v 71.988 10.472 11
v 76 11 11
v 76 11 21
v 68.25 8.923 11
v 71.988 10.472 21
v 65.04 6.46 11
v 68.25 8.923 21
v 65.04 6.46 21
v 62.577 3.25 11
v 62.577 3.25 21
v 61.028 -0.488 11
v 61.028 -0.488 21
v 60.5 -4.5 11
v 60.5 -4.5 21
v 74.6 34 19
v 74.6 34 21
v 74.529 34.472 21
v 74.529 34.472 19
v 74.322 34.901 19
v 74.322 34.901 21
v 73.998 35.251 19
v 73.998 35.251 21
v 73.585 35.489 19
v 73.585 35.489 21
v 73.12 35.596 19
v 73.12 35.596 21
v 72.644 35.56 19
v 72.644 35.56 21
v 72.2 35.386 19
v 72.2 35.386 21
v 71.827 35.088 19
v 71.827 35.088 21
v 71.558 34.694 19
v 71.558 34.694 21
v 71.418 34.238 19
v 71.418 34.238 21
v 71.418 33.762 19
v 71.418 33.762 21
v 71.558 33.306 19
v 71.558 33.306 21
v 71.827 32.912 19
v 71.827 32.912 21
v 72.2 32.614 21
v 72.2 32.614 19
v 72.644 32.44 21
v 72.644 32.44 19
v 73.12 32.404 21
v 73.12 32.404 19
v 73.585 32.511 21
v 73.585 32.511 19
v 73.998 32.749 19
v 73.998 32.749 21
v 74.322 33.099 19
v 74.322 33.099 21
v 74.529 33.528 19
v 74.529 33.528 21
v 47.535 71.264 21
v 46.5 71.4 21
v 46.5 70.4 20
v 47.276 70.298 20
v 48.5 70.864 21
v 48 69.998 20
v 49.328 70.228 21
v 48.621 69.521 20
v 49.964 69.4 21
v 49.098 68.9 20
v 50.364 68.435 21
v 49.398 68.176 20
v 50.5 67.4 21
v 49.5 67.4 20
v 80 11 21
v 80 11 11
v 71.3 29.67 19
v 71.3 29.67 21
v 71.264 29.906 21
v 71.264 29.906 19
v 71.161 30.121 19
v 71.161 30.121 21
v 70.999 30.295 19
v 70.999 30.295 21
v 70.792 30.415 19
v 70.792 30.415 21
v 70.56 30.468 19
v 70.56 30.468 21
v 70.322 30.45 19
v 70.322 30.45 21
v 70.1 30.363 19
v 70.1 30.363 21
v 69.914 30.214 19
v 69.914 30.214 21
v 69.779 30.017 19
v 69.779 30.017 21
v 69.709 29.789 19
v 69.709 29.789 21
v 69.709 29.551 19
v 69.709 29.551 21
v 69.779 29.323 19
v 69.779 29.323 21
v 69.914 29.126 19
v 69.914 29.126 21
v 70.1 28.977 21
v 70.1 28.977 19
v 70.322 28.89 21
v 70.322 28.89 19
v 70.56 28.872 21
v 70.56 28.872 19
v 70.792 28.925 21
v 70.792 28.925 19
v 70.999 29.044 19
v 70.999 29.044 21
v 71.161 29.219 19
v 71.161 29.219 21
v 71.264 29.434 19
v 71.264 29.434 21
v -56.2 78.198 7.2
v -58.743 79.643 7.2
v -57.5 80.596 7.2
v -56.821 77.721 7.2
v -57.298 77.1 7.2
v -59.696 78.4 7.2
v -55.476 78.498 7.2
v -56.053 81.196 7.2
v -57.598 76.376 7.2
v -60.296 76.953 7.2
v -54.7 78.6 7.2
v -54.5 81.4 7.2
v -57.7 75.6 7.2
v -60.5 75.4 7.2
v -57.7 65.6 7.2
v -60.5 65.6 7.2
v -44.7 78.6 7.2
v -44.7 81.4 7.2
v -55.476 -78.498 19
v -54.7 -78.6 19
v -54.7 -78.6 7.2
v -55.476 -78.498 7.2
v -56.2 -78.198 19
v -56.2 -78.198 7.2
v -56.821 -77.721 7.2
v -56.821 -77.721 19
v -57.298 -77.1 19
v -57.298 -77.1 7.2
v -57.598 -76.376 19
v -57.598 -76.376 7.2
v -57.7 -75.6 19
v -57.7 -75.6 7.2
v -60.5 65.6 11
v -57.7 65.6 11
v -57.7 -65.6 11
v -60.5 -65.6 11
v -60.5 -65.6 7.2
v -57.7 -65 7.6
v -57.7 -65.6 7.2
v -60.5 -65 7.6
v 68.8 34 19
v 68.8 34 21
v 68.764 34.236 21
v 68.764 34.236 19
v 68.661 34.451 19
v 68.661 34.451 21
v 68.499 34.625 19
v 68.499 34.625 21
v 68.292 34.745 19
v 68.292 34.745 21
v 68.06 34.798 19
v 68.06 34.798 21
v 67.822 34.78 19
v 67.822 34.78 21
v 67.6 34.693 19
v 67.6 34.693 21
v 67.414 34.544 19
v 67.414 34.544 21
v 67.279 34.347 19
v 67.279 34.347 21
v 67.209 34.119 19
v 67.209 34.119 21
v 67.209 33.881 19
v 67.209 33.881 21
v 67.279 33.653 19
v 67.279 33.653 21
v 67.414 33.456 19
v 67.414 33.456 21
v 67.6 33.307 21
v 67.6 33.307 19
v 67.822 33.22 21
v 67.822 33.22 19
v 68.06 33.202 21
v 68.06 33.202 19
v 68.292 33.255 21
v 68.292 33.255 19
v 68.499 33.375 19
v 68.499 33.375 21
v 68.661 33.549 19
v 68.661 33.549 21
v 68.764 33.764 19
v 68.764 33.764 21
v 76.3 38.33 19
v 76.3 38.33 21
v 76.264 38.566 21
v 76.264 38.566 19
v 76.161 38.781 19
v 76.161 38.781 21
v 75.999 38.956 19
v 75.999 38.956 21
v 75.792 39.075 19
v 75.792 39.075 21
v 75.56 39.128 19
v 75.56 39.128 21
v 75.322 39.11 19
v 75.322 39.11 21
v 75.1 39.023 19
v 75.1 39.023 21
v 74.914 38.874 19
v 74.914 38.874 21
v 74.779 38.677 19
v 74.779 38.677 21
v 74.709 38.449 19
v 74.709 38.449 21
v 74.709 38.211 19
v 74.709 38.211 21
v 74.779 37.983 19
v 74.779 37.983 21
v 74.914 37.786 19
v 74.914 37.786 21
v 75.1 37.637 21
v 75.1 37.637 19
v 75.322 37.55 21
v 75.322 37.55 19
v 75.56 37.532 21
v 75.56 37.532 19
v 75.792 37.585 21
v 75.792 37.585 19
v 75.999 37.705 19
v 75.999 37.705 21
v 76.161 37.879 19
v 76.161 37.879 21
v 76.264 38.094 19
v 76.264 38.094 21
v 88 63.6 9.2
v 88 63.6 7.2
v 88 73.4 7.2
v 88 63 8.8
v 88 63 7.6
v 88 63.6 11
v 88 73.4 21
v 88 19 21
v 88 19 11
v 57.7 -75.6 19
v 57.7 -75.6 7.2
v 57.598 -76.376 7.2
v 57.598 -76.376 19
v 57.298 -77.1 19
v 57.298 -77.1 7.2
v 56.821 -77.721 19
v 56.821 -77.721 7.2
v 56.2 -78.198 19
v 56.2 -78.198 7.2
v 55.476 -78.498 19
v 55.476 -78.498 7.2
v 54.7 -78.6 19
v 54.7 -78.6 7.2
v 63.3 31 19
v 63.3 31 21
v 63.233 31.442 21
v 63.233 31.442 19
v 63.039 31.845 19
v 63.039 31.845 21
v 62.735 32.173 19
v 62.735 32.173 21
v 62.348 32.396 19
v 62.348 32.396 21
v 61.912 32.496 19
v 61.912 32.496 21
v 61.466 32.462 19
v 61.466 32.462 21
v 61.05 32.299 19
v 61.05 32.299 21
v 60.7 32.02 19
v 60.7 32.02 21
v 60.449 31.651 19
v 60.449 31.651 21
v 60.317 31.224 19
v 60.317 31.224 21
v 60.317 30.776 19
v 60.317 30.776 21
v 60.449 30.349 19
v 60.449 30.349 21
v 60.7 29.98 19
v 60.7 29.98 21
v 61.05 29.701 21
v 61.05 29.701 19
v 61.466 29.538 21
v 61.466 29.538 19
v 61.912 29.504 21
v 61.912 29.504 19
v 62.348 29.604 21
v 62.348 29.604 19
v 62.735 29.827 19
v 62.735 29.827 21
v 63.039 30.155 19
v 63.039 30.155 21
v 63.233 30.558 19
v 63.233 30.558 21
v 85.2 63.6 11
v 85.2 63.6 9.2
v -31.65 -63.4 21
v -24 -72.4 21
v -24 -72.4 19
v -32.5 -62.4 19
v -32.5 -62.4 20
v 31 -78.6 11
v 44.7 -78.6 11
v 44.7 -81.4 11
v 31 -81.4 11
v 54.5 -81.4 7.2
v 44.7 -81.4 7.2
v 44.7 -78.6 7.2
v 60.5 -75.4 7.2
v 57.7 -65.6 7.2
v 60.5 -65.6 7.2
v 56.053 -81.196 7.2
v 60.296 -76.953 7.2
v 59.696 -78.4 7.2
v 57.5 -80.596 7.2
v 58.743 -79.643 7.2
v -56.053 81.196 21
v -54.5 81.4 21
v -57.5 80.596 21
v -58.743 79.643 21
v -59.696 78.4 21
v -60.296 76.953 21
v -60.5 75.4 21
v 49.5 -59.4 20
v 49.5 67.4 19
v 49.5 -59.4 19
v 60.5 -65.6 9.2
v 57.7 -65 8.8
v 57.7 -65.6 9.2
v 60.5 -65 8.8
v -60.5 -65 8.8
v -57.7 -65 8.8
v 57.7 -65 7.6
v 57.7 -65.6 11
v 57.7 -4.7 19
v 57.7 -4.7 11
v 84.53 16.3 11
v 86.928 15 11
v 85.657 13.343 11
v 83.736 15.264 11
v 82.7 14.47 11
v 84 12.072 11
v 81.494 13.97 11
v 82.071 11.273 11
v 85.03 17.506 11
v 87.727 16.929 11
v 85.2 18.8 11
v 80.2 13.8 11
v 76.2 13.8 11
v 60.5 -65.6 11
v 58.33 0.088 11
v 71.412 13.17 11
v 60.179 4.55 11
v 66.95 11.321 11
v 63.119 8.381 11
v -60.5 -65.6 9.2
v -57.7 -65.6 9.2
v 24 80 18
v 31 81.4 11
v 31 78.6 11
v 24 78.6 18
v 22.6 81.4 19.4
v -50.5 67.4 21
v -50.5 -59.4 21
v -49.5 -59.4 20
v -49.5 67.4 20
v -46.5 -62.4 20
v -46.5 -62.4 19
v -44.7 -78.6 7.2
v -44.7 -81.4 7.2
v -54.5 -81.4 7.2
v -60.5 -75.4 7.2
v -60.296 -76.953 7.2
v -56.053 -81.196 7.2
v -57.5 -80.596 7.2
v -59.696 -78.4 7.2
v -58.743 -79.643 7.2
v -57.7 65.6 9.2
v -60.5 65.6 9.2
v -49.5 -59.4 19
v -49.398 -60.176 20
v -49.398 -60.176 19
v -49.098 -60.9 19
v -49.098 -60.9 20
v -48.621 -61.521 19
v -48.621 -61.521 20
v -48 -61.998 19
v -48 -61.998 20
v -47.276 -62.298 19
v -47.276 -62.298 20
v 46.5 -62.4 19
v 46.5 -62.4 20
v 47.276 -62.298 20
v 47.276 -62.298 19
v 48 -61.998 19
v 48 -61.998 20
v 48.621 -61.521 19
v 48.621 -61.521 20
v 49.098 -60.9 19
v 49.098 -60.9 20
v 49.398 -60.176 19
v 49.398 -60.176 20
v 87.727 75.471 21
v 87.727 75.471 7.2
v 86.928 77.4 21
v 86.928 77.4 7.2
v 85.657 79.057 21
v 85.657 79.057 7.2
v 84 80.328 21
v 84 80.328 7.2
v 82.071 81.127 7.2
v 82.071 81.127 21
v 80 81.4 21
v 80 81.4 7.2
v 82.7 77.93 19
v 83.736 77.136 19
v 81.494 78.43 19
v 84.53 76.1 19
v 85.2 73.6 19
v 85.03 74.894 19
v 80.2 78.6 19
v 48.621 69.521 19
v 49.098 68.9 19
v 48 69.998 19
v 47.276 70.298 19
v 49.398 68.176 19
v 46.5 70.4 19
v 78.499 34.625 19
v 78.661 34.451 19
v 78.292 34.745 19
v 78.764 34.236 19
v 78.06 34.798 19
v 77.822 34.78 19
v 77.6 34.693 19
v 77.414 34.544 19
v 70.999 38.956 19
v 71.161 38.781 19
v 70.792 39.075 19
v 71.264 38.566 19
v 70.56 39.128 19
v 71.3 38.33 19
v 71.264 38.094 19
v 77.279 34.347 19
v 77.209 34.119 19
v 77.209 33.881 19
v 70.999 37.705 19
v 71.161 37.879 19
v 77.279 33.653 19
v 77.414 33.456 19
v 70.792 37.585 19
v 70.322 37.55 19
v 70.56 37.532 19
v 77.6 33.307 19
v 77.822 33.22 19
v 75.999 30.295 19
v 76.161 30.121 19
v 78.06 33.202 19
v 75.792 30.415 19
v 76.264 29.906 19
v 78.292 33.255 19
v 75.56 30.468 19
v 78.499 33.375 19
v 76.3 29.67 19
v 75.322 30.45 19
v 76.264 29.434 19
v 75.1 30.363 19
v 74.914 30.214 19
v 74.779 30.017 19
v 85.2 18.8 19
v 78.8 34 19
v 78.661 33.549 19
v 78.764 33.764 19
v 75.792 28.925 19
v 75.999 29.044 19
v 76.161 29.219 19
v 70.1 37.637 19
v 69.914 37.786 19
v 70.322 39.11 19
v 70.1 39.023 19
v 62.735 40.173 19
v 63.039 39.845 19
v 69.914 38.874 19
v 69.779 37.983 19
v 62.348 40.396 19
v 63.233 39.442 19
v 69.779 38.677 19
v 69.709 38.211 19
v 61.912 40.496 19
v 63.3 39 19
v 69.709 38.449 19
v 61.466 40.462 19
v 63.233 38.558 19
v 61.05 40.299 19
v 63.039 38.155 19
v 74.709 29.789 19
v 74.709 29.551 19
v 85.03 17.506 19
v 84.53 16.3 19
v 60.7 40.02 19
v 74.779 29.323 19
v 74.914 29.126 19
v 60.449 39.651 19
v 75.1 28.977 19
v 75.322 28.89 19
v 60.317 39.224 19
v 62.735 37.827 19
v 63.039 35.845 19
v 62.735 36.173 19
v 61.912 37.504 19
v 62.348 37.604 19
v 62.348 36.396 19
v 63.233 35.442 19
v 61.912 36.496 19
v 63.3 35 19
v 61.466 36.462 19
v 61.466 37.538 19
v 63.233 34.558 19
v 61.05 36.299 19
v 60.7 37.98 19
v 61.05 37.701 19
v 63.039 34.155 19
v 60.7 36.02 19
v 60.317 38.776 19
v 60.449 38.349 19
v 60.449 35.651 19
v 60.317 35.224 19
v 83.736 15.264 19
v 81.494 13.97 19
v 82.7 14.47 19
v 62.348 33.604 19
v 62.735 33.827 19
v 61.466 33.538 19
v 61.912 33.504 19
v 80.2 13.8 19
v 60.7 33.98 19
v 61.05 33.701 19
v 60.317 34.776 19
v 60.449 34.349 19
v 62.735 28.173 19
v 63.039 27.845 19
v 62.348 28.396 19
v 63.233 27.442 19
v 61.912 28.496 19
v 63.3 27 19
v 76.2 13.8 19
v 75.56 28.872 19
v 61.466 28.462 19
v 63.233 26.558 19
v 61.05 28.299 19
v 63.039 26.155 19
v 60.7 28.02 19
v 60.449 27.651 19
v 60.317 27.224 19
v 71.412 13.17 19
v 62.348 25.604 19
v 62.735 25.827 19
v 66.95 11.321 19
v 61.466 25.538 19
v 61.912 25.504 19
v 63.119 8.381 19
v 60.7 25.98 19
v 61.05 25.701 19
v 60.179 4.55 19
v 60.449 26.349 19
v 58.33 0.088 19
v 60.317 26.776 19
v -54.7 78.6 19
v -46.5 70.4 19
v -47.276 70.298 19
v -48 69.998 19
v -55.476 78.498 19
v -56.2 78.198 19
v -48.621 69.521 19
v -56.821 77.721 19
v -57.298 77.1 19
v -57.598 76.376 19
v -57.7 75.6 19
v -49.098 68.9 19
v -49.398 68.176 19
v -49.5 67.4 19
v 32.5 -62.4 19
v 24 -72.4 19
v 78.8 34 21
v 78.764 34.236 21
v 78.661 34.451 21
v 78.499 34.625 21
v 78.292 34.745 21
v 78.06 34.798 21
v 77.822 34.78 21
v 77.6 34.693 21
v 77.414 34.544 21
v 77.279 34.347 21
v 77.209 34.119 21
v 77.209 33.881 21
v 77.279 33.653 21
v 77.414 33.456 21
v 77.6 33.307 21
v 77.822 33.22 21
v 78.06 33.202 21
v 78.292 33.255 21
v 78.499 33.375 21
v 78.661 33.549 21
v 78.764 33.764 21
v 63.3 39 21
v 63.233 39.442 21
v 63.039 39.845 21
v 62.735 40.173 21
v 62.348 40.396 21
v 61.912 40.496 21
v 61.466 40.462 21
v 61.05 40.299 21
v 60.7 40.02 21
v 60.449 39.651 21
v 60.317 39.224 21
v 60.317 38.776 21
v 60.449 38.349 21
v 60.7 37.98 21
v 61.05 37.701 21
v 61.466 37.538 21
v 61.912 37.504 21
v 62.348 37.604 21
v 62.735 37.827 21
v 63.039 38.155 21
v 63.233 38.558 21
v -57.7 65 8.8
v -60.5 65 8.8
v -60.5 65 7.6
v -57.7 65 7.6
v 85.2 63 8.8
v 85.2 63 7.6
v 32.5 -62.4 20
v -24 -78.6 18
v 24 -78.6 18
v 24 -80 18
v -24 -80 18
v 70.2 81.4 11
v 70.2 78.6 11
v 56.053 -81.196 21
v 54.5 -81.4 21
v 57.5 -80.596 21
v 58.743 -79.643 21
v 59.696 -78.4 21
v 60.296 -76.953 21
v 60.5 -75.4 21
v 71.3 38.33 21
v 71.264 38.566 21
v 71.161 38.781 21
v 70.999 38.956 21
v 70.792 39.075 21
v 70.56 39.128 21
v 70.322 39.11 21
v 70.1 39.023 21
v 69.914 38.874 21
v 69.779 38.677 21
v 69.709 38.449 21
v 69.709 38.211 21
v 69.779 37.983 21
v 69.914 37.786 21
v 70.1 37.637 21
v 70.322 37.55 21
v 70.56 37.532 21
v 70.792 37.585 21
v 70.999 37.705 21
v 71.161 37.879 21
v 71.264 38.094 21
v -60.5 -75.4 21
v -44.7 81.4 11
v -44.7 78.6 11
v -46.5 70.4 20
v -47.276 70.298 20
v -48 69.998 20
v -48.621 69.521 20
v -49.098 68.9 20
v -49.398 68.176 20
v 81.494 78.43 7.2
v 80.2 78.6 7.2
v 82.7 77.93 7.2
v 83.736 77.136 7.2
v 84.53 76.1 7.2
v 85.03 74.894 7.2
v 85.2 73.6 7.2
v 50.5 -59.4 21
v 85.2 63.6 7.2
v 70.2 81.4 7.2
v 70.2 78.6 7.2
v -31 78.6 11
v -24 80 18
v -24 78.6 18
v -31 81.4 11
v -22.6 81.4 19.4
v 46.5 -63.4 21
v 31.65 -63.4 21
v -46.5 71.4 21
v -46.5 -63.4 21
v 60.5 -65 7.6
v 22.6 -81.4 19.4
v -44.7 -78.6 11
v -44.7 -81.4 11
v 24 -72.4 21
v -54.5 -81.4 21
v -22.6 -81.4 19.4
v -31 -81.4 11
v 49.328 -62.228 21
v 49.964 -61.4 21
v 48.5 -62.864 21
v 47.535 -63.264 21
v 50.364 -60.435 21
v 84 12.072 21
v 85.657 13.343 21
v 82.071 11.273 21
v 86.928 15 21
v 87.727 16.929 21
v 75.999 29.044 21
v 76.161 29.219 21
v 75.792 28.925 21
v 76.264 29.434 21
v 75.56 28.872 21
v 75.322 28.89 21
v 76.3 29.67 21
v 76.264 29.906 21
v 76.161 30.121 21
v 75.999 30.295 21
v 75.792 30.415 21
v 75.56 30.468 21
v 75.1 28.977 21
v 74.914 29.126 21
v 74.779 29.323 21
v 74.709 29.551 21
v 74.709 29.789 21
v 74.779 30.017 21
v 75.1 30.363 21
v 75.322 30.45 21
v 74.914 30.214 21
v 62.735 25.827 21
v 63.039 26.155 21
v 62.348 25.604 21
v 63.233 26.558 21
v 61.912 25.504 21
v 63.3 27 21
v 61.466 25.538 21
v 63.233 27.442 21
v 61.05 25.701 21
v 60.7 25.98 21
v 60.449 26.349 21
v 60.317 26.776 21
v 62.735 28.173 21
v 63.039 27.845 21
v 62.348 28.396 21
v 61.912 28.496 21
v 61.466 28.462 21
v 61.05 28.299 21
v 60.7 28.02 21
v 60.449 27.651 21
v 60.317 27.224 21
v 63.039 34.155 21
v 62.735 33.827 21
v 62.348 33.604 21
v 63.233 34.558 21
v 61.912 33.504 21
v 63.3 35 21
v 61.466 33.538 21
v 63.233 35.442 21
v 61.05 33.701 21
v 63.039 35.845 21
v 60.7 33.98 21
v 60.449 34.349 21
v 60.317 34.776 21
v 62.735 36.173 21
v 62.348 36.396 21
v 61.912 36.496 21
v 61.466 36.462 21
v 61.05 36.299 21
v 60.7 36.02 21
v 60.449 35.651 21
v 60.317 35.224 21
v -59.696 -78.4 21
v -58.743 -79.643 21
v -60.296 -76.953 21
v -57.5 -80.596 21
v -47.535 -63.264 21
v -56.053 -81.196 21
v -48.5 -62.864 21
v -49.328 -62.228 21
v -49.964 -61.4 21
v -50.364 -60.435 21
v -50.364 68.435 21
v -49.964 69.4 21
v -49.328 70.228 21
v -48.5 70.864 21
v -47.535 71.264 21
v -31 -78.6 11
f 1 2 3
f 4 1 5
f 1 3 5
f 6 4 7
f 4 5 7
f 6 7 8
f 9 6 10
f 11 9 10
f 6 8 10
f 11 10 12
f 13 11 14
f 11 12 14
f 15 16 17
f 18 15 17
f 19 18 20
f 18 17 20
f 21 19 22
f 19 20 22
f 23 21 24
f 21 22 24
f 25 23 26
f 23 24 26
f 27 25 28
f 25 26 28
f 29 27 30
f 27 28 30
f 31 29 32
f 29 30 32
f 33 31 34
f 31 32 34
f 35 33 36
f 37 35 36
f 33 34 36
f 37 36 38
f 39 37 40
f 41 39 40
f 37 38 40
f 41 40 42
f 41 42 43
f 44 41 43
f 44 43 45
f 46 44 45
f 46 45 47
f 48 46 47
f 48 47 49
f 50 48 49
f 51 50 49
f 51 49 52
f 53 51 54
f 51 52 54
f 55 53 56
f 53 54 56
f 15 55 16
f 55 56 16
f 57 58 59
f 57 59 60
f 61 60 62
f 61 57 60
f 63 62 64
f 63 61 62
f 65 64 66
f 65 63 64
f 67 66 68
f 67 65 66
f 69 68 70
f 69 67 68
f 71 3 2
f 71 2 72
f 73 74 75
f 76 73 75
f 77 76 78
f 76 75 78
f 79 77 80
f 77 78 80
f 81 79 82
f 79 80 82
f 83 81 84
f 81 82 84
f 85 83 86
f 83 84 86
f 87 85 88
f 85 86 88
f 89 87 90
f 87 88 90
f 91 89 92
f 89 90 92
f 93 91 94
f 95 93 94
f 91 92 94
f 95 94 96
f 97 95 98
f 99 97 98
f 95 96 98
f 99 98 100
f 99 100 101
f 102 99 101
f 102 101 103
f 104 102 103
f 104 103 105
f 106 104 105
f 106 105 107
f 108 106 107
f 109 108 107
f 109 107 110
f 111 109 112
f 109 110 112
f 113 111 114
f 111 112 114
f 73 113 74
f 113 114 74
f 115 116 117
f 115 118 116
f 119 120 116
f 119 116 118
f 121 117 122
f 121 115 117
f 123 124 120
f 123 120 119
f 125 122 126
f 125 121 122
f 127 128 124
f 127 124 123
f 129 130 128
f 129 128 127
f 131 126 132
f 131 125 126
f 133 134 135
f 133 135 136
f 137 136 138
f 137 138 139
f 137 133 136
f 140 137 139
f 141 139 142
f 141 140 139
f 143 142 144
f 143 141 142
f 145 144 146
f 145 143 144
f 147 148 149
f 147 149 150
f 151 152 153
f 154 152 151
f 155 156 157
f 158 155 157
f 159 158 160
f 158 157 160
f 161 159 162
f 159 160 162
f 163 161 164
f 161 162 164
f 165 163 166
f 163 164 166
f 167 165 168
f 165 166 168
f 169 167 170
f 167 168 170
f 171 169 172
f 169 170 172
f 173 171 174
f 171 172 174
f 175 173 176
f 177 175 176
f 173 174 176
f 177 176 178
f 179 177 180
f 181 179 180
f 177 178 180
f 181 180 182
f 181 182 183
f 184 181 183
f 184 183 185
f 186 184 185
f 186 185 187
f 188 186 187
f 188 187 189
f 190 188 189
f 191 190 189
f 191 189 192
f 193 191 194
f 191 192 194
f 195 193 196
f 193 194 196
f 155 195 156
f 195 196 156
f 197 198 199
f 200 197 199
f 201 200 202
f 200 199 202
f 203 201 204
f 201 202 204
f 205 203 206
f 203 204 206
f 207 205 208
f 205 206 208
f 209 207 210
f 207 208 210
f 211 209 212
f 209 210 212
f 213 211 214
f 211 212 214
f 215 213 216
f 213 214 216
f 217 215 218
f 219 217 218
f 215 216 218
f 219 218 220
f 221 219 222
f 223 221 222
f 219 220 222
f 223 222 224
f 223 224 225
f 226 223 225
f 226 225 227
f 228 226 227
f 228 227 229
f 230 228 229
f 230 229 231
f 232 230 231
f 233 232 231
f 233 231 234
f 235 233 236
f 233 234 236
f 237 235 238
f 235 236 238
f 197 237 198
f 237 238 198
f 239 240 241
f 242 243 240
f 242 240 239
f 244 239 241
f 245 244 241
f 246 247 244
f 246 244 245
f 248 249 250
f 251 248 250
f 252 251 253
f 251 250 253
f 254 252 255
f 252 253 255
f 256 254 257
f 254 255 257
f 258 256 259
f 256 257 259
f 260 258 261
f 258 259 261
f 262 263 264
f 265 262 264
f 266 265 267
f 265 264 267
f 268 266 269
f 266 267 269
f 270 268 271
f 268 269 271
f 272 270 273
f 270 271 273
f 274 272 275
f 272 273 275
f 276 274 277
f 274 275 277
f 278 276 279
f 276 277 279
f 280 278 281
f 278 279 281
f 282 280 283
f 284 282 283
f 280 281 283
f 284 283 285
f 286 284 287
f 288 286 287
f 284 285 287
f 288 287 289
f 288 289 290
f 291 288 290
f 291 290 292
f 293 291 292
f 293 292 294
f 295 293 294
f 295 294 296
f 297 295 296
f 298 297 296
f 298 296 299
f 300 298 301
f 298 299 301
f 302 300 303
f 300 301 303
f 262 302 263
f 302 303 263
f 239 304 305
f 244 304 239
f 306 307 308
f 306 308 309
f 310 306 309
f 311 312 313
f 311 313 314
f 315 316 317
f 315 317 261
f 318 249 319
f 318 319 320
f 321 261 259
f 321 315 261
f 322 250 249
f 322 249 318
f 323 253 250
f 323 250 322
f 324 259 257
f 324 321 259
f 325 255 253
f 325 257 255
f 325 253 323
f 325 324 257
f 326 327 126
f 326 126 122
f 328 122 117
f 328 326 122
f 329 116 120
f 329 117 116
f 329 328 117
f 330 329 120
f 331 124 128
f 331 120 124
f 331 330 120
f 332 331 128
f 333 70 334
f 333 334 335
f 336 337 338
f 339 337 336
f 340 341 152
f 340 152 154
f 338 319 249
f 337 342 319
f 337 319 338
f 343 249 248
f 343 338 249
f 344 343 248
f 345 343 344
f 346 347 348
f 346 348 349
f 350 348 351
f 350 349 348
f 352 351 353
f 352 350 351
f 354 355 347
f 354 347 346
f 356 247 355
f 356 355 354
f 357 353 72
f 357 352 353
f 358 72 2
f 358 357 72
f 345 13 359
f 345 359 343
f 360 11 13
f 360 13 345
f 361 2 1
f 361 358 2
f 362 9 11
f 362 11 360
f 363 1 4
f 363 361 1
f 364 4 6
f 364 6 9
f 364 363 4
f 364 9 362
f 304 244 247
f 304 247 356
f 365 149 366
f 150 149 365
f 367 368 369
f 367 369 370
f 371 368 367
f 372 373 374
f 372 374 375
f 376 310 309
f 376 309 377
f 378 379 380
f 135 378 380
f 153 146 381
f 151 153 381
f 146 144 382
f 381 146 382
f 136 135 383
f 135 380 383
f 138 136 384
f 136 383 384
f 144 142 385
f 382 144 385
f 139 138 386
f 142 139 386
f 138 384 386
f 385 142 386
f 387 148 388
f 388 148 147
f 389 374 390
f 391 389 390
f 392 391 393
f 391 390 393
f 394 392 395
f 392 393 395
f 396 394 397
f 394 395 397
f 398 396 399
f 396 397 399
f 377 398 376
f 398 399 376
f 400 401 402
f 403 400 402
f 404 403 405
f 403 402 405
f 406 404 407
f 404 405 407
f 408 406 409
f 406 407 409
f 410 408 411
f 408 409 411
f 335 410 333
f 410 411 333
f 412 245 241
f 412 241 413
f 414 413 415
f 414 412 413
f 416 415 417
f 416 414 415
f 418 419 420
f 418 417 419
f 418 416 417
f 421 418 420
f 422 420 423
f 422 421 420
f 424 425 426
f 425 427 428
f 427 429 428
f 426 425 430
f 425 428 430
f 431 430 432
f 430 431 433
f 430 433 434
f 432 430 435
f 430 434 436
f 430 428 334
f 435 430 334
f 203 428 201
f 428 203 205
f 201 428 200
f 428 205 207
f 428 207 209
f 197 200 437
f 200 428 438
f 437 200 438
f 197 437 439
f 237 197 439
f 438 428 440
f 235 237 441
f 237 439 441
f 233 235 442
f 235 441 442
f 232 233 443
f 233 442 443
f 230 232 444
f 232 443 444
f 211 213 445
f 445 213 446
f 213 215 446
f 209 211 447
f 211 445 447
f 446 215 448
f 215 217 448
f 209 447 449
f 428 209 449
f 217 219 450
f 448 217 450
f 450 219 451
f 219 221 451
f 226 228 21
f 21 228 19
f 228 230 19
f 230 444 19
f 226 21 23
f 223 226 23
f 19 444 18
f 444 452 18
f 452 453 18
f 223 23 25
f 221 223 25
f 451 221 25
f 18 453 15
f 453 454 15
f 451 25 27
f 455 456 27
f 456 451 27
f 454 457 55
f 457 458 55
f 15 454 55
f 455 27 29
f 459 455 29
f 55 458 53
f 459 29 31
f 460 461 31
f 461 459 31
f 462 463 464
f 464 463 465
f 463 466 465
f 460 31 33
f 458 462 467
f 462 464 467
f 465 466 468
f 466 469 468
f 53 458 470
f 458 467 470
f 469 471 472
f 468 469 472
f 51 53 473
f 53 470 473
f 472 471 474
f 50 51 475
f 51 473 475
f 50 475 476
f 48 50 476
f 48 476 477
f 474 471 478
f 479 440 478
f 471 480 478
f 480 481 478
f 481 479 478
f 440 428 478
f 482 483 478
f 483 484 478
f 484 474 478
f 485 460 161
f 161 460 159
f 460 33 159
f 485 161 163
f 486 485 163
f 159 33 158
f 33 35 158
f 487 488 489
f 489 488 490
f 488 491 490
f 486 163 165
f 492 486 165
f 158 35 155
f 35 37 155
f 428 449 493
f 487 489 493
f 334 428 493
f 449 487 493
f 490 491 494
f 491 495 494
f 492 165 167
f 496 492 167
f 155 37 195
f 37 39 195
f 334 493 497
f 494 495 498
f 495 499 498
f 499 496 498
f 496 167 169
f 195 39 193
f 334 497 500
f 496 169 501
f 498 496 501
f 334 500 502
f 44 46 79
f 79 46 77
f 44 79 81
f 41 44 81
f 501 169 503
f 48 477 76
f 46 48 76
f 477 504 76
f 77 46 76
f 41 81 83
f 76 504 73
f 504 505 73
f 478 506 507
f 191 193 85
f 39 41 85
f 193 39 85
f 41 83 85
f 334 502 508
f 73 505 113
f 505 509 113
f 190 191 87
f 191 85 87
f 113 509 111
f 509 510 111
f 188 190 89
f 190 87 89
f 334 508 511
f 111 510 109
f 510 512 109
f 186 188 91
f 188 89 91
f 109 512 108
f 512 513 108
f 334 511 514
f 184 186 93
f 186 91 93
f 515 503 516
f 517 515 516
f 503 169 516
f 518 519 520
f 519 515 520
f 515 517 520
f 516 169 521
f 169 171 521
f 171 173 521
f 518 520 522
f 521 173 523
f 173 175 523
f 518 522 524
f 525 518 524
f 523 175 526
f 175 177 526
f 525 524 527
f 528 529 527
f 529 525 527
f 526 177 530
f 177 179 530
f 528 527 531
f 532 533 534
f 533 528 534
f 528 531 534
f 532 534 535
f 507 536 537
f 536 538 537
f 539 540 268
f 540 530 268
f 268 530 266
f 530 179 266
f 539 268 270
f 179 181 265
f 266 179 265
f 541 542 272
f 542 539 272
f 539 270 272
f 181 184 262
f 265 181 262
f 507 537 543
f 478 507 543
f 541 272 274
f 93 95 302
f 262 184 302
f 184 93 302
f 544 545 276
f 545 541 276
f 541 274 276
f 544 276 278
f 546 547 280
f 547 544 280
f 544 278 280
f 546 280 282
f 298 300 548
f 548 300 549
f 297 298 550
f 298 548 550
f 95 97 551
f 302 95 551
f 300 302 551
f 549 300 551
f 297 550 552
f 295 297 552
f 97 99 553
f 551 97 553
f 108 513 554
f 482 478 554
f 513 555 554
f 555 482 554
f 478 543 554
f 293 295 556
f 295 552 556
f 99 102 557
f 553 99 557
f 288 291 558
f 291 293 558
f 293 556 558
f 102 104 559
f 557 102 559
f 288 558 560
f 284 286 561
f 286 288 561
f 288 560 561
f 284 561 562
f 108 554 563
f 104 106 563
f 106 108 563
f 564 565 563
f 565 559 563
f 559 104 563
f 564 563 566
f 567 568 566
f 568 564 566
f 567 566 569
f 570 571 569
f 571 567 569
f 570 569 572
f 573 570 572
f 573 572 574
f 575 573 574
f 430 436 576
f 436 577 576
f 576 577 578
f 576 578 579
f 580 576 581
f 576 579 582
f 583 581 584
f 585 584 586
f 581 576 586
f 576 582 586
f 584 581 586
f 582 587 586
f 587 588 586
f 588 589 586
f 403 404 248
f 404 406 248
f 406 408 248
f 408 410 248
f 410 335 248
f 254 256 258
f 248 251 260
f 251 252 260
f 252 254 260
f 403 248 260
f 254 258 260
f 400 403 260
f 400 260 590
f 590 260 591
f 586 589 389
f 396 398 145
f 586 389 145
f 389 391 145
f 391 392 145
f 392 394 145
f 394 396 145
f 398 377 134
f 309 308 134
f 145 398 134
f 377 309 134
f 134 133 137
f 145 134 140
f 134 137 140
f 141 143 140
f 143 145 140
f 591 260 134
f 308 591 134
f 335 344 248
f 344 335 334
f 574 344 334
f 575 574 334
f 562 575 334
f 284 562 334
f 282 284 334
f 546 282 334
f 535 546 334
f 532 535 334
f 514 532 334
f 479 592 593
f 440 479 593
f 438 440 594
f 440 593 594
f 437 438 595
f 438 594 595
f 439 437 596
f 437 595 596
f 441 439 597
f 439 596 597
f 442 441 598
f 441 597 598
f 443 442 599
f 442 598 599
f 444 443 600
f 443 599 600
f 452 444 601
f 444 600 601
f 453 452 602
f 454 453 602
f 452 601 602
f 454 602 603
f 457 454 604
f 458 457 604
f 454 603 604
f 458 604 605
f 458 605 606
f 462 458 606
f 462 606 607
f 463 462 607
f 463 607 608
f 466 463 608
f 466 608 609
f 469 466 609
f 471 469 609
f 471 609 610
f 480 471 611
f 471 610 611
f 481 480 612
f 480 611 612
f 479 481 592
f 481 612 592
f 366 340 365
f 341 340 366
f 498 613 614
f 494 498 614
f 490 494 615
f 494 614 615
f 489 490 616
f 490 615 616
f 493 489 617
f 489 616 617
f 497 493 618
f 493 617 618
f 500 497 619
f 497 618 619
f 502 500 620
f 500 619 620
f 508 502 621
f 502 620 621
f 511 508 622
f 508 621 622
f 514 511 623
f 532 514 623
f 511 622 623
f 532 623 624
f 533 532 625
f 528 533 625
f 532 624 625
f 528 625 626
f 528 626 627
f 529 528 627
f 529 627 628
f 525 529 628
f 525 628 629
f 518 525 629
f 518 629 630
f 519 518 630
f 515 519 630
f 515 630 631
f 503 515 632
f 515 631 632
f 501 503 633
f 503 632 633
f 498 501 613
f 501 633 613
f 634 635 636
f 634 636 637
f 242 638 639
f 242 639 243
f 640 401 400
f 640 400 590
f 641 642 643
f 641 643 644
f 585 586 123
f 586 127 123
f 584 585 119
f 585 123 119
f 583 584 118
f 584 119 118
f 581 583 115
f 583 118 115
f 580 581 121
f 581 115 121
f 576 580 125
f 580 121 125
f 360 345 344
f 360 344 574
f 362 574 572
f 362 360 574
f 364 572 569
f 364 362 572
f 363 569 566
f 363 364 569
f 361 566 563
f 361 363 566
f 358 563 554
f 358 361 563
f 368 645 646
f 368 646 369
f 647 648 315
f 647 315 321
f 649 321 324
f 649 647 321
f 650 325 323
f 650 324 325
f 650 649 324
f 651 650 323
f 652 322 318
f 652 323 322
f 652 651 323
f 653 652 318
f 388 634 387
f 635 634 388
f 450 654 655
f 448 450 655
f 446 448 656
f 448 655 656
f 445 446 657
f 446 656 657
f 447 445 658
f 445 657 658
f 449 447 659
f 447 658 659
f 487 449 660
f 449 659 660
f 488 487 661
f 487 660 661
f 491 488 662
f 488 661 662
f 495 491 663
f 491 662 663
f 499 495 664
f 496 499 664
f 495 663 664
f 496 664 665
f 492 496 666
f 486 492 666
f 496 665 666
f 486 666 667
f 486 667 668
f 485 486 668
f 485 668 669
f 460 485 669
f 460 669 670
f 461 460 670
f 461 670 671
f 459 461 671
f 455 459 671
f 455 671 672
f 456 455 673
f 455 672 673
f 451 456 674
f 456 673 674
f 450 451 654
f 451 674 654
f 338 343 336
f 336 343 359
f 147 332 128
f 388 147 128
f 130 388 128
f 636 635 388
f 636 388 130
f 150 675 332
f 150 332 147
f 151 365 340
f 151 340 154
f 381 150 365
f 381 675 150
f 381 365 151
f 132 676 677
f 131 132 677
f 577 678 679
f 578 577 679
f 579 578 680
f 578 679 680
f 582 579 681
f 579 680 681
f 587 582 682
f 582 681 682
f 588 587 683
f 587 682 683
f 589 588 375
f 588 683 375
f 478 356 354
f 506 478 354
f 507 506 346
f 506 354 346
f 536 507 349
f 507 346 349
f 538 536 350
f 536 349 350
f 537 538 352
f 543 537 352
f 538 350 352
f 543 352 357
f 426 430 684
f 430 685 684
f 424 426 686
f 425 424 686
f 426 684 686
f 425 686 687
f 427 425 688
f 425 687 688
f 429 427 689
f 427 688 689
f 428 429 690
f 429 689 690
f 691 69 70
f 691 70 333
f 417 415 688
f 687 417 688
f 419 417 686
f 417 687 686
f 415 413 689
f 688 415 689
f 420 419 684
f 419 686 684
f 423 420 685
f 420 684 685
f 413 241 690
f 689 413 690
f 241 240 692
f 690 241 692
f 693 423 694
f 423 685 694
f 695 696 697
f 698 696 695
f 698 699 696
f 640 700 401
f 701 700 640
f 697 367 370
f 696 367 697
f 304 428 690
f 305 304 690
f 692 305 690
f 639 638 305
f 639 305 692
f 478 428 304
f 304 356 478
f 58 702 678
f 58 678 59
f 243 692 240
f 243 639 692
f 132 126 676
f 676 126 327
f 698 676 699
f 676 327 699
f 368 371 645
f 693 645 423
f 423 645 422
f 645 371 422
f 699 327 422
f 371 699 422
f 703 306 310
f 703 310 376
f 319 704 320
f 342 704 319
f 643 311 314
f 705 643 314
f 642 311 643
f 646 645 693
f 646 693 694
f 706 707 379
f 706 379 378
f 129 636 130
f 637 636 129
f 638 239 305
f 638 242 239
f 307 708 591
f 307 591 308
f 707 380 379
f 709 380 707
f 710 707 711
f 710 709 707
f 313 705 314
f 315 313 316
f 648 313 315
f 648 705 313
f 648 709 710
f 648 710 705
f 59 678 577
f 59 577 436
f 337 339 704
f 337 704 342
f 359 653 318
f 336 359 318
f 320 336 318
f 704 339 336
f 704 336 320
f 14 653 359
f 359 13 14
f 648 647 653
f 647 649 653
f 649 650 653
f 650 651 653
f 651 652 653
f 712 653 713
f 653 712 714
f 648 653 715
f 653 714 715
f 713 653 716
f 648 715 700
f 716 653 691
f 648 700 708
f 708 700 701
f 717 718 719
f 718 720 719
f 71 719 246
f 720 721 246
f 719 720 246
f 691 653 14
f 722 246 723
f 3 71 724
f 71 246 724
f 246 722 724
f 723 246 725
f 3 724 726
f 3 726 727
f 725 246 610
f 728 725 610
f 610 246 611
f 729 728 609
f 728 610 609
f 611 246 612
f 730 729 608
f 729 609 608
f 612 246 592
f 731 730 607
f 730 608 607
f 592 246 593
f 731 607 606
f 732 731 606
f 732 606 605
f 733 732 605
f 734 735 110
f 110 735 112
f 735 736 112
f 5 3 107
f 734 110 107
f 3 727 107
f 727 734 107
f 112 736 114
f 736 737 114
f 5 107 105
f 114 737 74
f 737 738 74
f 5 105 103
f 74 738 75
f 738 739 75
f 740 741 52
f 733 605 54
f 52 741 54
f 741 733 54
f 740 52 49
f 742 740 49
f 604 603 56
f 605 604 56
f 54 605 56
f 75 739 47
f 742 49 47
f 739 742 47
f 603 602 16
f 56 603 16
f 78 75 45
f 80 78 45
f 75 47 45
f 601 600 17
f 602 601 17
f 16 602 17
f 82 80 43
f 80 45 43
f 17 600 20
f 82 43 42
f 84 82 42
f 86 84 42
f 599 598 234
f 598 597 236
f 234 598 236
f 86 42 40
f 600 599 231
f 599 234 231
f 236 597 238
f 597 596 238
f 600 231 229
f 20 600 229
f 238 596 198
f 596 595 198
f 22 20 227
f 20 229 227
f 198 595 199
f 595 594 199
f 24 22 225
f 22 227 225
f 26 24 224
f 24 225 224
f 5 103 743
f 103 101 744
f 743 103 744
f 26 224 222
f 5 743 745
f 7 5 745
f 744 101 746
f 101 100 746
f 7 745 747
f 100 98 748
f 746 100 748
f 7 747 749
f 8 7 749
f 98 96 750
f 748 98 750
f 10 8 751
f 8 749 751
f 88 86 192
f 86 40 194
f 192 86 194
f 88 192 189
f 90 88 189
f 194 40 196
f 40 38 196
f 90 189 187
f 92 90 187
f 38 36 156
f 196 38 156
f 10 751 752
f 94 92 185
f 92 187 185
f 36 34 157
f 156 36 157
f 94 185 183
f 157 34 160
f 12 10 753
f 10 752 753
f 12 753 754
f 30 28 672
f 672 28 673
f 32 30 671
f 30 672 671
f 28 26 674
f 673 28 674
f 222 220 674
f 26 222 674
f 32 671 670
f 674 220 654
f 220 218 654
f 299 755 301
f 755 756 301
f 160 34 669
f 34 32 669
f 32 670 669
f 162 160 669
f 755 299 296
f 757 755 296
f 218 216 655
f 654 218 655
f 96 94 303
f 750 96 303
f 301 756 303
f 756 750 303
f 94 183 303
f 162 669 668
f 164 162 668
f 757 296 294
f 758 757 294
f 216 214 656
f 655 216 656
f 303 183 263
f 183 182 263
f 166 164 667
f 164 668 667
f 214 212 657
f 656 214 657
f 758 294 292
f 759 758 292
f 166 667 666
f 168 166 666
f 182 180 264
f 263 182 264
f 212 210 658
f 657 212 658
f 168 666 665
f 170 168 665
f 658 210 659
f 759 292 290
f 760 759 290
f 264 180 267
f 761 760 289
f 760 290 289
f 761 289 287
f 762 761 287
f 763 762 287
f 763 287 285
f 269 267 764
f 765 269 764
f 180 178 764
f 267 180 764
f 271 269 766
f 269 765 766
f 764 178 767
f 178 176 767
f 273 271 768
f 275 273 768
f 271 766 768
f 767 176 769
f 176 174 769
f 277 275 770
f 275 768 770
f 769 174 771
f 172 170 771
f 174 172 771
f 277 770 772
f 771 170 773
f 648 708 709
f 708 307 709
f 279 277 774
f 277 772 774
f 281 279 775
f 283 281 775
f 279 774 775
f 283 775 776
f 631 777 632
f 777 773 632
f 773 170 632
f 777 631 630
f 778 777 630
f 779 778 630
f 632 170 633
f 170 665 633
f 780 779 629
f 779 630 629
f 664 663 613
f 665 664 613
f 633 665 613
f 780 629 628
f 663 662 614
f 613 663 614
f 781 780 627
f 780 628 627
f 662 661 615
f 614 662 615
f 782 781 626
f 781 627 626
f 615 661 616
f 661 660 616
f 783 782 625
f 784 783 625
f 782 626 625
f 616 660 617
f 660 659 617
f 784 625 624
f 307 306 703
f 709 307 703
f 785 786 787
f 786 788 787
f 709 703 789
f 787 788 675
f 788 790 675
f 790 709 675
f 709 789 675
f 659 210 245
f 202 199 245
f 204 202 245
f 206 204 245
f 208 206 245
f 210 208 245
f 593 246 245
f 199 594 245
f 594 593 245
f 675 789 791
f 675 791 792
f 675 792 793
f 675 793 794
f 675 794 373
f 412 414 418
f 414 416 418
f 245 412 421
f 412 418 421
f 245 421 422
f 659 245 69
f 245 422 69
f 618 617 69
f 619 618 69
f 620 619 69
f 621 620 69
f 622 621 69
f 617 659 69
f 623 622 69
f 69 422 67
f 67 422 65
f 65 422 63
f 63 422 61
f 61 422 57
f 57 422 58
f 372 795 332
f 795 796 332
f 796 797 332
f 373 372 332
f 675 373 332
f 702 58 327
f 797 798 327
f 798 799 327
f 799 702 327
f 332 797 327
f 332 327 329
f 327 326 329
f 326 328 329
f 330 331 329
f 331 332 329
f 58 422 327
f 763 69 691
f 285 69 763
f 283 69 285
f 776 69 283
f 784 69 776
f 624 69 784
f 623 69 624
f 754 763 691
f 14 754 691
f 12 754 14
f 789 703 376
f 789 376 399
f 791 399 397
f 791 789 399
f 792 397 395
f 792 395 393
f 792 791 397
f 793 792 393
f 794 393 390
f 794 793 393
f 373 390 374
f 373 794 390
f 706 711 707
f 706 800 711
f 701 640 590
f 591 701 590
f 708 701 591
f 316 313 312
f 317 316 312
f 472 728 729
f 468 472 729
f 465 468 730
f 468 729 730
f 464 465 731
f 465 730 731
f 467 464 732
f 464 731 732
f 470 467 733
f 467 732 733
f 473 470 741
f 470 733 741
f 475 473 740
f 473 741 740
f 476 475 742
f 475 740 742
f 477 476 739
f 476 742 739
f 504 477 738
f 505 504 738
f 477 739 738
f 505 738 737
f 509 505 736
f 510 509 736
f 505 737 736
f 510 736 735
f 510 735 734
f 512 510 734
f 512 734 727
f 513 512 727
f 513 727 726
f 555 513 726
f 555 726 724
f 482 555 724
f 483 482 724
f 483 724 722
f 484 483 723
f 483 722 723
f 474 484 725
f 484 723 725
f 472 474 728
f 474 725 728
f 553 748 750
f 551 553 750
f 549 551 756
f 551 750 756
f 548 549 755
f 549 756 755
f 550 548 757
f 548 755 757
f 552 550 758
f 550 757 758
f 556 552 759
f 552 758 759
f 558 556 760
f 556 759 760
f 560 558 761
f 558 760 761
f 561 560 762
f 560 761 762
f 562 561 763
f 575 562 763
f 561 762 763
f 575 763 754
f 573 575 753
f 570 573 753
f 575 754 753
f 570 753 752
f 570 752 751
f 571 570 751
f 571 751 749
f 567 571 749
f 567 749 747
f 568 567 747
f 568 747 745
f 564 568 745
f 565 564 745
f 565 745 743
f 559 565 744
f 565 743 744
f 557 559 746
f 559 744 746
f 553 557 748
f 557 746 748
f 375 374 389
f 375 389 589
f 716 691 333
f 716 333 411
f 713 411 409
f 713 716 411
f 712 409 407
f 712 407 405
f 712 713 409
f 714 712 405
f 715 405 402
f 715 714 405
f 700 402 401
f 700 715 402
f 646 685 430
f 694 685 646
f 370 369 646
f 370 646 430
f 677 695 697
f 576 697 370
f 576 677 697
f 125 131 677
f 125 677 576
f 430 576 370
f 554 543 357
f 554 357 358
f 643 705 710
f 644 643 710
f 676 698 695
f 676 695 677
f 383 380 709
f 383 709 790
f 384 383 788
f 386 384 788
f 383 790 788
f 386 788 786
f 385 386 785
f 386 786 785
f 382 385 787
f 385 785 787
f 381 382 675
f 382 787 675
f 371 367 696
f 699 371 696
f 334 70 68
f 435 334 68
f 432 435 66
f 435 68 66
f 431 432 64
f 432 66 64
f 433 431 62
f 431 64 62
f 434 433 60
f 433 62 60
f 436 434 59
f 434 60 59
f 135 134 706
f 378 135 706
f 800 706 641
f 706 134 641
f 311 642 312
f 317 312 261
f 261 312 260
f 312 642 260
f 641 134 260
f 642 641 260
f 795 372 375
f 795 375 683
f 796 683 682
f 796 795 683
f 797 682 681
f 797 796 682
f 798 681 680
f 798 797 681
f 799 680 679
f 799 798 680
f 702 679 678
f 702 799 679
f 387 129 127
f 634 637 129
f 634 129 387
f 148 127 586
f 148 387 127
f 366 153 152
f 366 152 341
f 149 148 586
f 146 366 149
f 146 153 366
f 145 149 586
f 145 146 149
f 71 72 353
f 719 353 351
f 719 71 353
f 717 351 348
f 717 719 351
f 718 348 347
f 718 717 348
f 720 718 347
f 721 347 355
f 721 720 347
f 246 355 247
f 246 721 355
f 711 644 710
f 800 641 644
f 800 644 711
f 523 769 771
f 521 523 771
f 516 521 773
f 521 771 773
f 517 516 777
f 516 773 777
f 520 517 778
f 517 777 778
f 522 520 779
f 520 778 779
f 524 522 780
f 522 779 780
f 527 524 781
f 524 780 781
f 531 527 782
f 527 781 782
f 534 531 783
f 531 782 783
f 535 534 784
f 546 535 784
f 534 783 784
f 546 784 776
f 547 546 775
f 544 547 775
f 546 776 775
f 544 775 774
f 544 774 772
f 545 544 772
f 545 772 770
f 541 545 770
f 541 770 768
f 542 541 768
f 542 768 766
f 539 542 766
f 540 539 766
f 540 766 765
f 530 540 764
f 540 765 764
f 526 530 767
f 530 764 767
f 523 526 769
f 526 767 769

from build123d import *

# Parameters (mm, degrees)
PAD007_DEPTH    = 10
POCKET006_DEPTH = 8
POCKET007_DEPTH = 2
SKETCH022_R     = 1.5
SKETCH022_R_2   = 1.6
SKETCH022_R_3   = 0.8
POCKET009_DEPTH = 2
POCKET010_DEPTH = 162.801
PAD011_DEPTH    = 3.8
SKETCH045_W     = 2.8
SKETCH045_H     = 2
SKETCH046_W     = 2.8
SKETCH046_H     = 1.2
SKETCH047_W     = 2.8
SKETCH047_H     = 2
SKETCH048_W     = 2.8
SKETCH048_H     = 1.2
SKETCH049_W     = 2.8
SKETCH049_H     = 2
SKETCH050_W     = 2.8
SKETCH050_H     = 1.2
SKETCH051_W     = 2.8
SKETCH051_H     = 2
SKETCH052_W     = 2.8
SKETCH052_H     = 1.2
CHAMFER003_SIZE = 1.4
CHAMFER004_SIZE = 1


with BuildPart() as part:
    # Sketch014 → Pad007 (new body)
    with BuildSketch(Plane.XY):
        with BuildLine():
            Line((-54.5, 81.4), (80, 81.4))
            ThreePointArc((88, 73.4), (85.656854, 79.056854), (80, 81.4))
            Line((88, 73.4), (88, 19))
            ThreePointArc((80, 11), (85.656854, 13.343146), (88, 19))
            Line((76, 11), (80, 11))
            ThreePointArc((76, 11), (65.039845, 6.460155), (60.5, -4.5))
            Line((60.5, -75.4), (60.5, -4.5))
            ThreePointArc((54.5, -81.4), (58.742641, -79.642641), (60.5, -75.4))
            Line((54.5, -81.4), (-54.5, -81.4))
            ThreePointArc((-60.5, -75.4), (-58.742641, -79.642641), (-54.5, -81.4))
            Line((-60.5, -75.4), (-60.5, 75.4))
            ThreePointArc((-54.5, 81.4), (-58.742641, 79.642641), (-60.5, 75.4))
        make_face()
    extrude(amount=-PAD007_DEPTH)

    # Sketch017 (on Face14 of Pad007) → Pocket006 (cut)
    with BuildSketch(Plane(origin=(0, 0, -10), x_dir=(1, 0, 0), z_dir=(0, 0, -1))):
        with BuildLine():
            Line((-54.7, 78.6), (54.7, 78.6))
            ThreePointArc((57.7, 75.6), (56.82132, 77.72132), (54.7, 78.6))
            Line((57.7, 4.7), (57.7, 75.6))
            ThreePointArc((57.7, 4.7), (63.118525, -8.381475), (76.2, -13.8))
            Line((80.2, -13.8), (76.2, -13.8))
            ThreePointArc((85.2, -18.8), (83.735534, -15.264466), (80.2, -13.8))
            Line((85.2, -18.8), (85.2, -73.6))
            ThreePointArc((80.2, -78.6), (83.735534, -77.135534), (85.2, -73.6))
            Line((80.2, -78.6), (-54.7, -78.6))
            ThreePointArc((-57.7, -75.6), (-56.82132, -77.72132), (-54.7, -78.6))
            Line((-57.7, -75.6), (-57.7, 75.6))
            ThreePointArc((-54.7, 78.6), (-56.82132, 77.72132), (-57.7, 75.6))
        make_face()
    extrude(amount=-POCKET006_DEPTH, mode=Mode.SUBTRACT)

    # Sketch018 (on Face4 of Pocket006) → Pocket007 (cut)
    with BuildSketch(Plane.XY):
        with BuildLine():
            Line((-46.5, 70.4), (46.5, 70.4))
            ThreePointArc((49.5, 67.4), (48.62132, 69.52132), (46.5, 70.4))
            Line((49.5, 67.4), (49.5, -59.4))
            ThreePointArc((46.5, -62.4), (48.62132, -61.52132), (49.5, -59.4))
            Line((46.5, -62.4), (32.5, -62.4))
            Line((32.5, -62.4), (24, -72.4))
            Line((24, -72.4), (-24, -72.4))
            Line((-24, -72.4), (-32.5, -62.4))
            Line((-32.5, -62.4), (-46.5, -62.4))
            ThreePointArc((-49.5, -59.4), (-48.62132, -61.52132), (-46.5, -62.4))
            Line((-49.5, -59.4), (-49.5, 67.4))
            ThreePointArc((-46.5, 70.4), (-48.62132, 69.52132), (-49.5, 67.4))
        make_face()
    extrude(amount=-POCKET007_DEPTH, mode=Mode.SUBTRACT)

    # Sketch022 (on Face4 of Pocket007) → Pocket009 (cut)
    with BuildSketch(Plane.XY):
        with Locations((61.8, 39)):
            Circle(SKETCH022_R)
        with Locations((61.8, 35)):
            Circle(SKETCH022_R)
        with Locations((61.8, 31)):
            Circle(SKETCH022_R)
        with Locations((61.8, 27)):
            Circle(SKETCH022_R)
        with Locations((73, 34)):
            Circle(SKETCH022_R_2)
        with Locations((70.5, 38.330127)):
            Circle(SKETCH022_R_3)
        with Locations((75.5, 38.330127)):
            Circle(SKETCH022_R_3)
        with Locations((78, 34)):
            Circle(SKETCH022_R_3)
        with Locations((75.5, 29.669873)):
            Circle(SKETCH022_R_3)
        with Locations((70.5, 29.669873)):
            Circle(SKETCH022_R_3)
        with Locations((68, 34)):
            Circle(SKETCH022_R_3)
    extrude(amount=-POCKET009_DEPTH, mode=Mode.SUBTRACT)

    # Sketch023 (on Face7 of Pocket009) → Pocket010 (cut, through all)
    with BuildSketch(Plane(origin=(0, 81.4, 0), x_dir=(-1, 0, 0), z_dir=(0, 1, 0))):
        Polygon((-24, -3), (24, -3), (31, -10), (-31, -10), align=None)
    extrude(amount=-POCKET010_DEPTH, mode=Mode.SUBTRACT)

    # Sketch026 (on Face5 of Pocket010) → Pad011 (join)
    with BuildSketch(Plane(origin=(0, 0, -10), x_dir=(1, 0, 0), z_dir=(0, 0, -1))):
        with BuildLine():
            Line((-54.5, 81.4), (-44.7, 81.4))
            Line((-44.7, 81.4), (-44.7, 78.6))
            Line((-54.7, 78.6), (-44.7, 78.6))
            ThreePointArc((-54.7, 78.6), (-56.82132, 77.72132), (-57.7, 75.6))
            Line((-57.7, 65.6), (-57.7, 75.6))
            Line((-57.7, 65.6), (-60.5, 65.6))
            Line((-60.5, 65.6), (-60.5, 75.4))
            ThreePointArc((-54.5, 81.4), (-58.742641, 79.642641), (-60.5, 75.4))
        make_face()
        with BuildLine():
            Line((54.5, 81.4), (44.7, 81.4))
            Line((44.7, 81.4), (44.7, 78.6))
            Line((54.7, 78.6), (44.7, 78.6))
            ThreePointArc((57.7, 75.6), (56.82132, 77.72132), (54.7, 78.6))
            Line((57.7, 65.6), (57.7, 75.6))
            Line((57.7, 65.6), (60.5, 65.6))
            Line((60.5, 65.6), (60.5, 75.4))
            ThreePointArc((60.5, 75.4), (58.742641, 79.642641), (54.5, 81.4))
        make_face()
        with BuildLine():
            Line((-54.5, -81.4), (-44.7, -81.4))
            Line((-44.7, -81.4), (-44.7, -78.6))
            Line((-54.7, -78.6), (-44.7, -78.6))
            ThreePointArc((-57.7, -75.6), (-56.82132, -77.72132), (-54.7, -78.6))
            Line((-57.7, -65.6), (-57.7, -75.6))
            Line((-57.7, -65.6), (-60.5, -65.6))
            Line((-60.5, -65.6), (-60.5, -75.4))
            ThreePointArc((-60.5, -75.4), (-58.742641, -79.642641), (-54.5, -81.4))
        make_face()
        with BuildLine():
            Line((80, -81.4), (70.2, -81.4))
            Line((70.2, -81.4), (70.2, -78.6))
            Line((80.2, -78.6), (70.2, -78.6))
            ThreePointArc((80.2, -78.6), (83.735534, -77.135534), (85.2, -73.6))
            Line((85.2, -63.6), (85.2, -73.6))
            Line((85.2, -63.6), (88, -63.6))
            Line((88, -63.6), (88, -73.4))
            ThreePointArc((80, -81.4), (85.656854, -79.056854), (88, -73.4))
        make_face()
    extrude(amount=PAD011_DEPTH)

    # Sketch045 (on DatumPlane) → AdditiveLoft section 0
    with BuildSketch(Plane(origin=(0, -65.6, 0), x_dir=(-1, 0, 0), z_dir=(0, 1, 0))):
        with Locations((-59.1, -12.8)):
            Rectangle(SKETCH045_W, SKETCH045_H)
    # Sketch046 (on DatumPlane) → AdditiveLoft section 1
    with BuildSketch(Plane(origin=(0, -65, 0), x_dir=(-1, 0, 0), z_dir=(0, 1, 0))):
        with Locations((-59.1, -12.8)):
            Rectangle(SKETCH046_W, SKETCH046_H)
    loft()

    # Sketch047 (on DatumPlane) → AdditiveLoft001 section 0
    with BuildSketch(Plane(origin=(0, -65.6, 0), x_dir=(-1, 0, 0), z_dir=(0, 1, 0))):
        with Locations((59.1, -12.8)):
            Rectangle(SKETCH047_W, SKETCH047_H)
    # Sketch048 (on DatumPlane) → AdditiveLoft001 section 1
    with BuildSketch(Plane(origin=(0, -65, 0), x_dir=(-1, 0, 0), z_dir=(0, 1, 0))):
        with Locations((59.1, -12.8)):
            Rectangle(SKETCH048_W, SKETCH048_H)
    loft()

    # Sketch049 (on DatumPlane) → AdditiveLoft002 section 0
    with BuildSketch(Plane.XZ.offset(-65.6)):
        with Locations((-59.1, -12.8)):
            Rectangle(SKETCH049_W, SKETCH049_H)
    # Sketch050 (on DatumPlane) → AdditiveLoft002 section 1
    with BuildSketch(Plane.XZ.offset(-65)):
        with Locations((-59.1, -12.8)):
            Rectangle(SKETCH050_W, SKETCH050_H)
    loft()

    # Sketch051 (on DatumPlane) → AdditiveLoft003 section 0
    with BuildSketch(Plane.XZ.offset(-63.6)):
        with Locations((86.6, -12.8)):
            Rectangle(SKETCH051_W, SKETCH051_H)
    # Sketch052 (on DatumPlane) → AdditiveLoft003 section 1
    with BuildSketch(Plane.XZ.offset(-63)):
        with Locations((86.6, -12.8)):
            Rectangle(SKETCH052_W, SKETCH052_H)
    loft()

    # Chamfer003
    chamfer003_edges = [part.edges().sort_by_distance(p)[0] for p in [
        (0, -81.4, -3),
        (0, 81.4, -3),
    ]]
    chamfer(chamfer003_edges, length=CHAMFER003_SIZE)

    # Chamfer004
    chamfer004_edges = [part.edges().sort_by_distance(p)[0] for p in [
        (-49.5, 4, 0),
    ]]
    chamfer(chamfer004_edges, length=CHAMFER004_SIZE)


with BuildPart() as part_1:
    # Body002 placement: moved
    add(part.part.moved(Location((0, 0, 21))))


solid = part_1.part
